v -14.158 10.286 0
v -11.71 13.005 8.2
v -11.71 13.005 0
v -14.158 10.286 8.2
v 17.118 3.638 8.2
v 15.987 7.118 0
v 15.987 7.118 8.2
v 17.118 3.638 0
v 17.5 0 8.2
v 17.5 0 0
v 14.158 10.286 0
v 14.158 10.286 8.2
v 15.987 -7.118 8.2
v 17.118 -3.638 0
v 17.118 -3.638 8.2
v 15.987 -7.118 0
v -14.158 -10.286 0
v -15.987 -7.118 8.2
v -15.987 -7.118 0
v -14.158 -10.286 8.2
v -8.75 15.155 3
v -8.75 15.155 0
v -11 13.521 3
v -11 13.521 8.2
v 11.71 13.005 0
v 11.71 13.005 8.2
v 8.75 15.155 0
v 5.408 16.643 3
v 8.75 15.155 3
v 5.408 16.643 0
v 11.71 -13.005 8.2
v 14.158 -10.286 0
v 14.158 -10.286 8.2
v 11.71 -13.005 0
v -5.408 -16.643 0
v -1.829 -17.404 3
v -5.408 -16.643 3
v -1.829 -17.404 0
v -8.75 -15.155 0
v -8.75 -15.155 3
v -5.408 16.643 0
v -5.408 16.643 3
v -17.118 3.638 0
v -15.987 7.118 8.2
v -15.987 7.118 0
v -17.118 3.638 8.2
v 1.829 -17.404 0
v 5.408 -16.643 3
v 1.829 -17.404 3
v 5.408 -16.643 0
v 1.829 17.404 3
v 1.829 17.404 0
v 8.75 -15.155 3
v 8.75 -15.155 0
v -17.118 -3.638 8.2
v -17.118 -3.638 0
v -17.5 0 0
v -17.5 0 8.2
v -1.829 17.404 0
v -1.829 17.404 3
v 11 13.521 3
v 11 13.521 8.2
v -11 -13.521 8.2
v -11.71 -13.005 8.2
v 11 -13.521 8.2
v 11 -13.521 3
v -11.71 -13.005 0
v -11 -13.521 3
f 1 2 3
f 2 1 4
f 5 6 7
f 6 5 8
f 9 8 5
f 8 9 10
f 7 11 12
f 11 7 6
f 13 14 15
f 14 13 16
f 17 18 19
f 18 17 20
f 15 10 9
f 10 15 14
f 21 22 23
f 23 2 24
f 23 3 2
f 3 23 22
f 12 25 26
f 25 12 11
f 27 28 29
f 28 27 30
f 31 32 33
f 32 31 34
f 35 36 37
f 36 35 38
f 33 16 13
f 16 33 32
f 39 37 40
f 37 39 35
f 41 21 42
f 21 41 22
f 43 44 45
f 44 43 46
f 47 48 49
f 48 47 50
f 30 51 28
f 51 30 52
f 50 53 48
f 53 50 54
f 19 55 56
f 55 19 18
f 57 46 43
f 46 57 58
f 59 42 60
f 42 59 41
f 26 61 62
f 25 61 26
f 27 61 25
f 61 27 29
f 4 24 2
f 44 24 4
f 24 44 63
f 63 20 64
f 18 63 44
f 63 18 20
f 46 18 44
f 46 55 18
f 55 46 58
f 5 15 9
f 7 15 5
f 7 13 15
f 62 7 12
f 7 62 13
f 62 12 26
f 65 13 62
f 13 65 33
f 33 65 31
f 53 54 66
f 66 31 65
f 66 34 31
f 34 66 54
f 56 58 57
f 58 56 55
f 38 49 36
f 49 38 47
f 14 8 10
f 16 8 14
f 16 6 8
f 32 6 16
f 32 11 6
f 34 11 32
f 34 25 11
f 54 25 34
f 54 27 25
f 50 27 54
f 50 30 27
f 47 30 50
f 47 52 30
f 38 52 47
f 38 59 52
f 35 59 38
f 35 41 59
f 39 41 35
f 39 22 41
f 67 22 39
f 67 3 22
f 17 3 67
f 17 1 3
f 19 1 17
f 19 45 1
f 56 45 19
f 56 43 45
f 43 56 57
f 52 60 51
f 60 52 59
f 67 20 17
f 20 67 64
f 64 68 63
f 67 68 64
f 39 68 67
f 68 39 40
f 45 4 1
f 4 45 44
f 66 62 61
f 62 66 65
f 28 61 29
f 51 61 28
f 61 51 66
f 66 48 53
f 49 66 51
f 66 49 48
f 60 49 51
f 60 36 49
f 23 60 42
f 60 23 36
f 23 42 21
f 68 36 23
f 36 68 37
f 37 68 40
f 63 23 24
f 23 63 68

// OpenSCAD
difference() {
    cylinder(h = 8.2, d = 35);
    translate([0, 0, 3+10/2]) {
        cube([22, 40, 10], center=true);
    }
}
